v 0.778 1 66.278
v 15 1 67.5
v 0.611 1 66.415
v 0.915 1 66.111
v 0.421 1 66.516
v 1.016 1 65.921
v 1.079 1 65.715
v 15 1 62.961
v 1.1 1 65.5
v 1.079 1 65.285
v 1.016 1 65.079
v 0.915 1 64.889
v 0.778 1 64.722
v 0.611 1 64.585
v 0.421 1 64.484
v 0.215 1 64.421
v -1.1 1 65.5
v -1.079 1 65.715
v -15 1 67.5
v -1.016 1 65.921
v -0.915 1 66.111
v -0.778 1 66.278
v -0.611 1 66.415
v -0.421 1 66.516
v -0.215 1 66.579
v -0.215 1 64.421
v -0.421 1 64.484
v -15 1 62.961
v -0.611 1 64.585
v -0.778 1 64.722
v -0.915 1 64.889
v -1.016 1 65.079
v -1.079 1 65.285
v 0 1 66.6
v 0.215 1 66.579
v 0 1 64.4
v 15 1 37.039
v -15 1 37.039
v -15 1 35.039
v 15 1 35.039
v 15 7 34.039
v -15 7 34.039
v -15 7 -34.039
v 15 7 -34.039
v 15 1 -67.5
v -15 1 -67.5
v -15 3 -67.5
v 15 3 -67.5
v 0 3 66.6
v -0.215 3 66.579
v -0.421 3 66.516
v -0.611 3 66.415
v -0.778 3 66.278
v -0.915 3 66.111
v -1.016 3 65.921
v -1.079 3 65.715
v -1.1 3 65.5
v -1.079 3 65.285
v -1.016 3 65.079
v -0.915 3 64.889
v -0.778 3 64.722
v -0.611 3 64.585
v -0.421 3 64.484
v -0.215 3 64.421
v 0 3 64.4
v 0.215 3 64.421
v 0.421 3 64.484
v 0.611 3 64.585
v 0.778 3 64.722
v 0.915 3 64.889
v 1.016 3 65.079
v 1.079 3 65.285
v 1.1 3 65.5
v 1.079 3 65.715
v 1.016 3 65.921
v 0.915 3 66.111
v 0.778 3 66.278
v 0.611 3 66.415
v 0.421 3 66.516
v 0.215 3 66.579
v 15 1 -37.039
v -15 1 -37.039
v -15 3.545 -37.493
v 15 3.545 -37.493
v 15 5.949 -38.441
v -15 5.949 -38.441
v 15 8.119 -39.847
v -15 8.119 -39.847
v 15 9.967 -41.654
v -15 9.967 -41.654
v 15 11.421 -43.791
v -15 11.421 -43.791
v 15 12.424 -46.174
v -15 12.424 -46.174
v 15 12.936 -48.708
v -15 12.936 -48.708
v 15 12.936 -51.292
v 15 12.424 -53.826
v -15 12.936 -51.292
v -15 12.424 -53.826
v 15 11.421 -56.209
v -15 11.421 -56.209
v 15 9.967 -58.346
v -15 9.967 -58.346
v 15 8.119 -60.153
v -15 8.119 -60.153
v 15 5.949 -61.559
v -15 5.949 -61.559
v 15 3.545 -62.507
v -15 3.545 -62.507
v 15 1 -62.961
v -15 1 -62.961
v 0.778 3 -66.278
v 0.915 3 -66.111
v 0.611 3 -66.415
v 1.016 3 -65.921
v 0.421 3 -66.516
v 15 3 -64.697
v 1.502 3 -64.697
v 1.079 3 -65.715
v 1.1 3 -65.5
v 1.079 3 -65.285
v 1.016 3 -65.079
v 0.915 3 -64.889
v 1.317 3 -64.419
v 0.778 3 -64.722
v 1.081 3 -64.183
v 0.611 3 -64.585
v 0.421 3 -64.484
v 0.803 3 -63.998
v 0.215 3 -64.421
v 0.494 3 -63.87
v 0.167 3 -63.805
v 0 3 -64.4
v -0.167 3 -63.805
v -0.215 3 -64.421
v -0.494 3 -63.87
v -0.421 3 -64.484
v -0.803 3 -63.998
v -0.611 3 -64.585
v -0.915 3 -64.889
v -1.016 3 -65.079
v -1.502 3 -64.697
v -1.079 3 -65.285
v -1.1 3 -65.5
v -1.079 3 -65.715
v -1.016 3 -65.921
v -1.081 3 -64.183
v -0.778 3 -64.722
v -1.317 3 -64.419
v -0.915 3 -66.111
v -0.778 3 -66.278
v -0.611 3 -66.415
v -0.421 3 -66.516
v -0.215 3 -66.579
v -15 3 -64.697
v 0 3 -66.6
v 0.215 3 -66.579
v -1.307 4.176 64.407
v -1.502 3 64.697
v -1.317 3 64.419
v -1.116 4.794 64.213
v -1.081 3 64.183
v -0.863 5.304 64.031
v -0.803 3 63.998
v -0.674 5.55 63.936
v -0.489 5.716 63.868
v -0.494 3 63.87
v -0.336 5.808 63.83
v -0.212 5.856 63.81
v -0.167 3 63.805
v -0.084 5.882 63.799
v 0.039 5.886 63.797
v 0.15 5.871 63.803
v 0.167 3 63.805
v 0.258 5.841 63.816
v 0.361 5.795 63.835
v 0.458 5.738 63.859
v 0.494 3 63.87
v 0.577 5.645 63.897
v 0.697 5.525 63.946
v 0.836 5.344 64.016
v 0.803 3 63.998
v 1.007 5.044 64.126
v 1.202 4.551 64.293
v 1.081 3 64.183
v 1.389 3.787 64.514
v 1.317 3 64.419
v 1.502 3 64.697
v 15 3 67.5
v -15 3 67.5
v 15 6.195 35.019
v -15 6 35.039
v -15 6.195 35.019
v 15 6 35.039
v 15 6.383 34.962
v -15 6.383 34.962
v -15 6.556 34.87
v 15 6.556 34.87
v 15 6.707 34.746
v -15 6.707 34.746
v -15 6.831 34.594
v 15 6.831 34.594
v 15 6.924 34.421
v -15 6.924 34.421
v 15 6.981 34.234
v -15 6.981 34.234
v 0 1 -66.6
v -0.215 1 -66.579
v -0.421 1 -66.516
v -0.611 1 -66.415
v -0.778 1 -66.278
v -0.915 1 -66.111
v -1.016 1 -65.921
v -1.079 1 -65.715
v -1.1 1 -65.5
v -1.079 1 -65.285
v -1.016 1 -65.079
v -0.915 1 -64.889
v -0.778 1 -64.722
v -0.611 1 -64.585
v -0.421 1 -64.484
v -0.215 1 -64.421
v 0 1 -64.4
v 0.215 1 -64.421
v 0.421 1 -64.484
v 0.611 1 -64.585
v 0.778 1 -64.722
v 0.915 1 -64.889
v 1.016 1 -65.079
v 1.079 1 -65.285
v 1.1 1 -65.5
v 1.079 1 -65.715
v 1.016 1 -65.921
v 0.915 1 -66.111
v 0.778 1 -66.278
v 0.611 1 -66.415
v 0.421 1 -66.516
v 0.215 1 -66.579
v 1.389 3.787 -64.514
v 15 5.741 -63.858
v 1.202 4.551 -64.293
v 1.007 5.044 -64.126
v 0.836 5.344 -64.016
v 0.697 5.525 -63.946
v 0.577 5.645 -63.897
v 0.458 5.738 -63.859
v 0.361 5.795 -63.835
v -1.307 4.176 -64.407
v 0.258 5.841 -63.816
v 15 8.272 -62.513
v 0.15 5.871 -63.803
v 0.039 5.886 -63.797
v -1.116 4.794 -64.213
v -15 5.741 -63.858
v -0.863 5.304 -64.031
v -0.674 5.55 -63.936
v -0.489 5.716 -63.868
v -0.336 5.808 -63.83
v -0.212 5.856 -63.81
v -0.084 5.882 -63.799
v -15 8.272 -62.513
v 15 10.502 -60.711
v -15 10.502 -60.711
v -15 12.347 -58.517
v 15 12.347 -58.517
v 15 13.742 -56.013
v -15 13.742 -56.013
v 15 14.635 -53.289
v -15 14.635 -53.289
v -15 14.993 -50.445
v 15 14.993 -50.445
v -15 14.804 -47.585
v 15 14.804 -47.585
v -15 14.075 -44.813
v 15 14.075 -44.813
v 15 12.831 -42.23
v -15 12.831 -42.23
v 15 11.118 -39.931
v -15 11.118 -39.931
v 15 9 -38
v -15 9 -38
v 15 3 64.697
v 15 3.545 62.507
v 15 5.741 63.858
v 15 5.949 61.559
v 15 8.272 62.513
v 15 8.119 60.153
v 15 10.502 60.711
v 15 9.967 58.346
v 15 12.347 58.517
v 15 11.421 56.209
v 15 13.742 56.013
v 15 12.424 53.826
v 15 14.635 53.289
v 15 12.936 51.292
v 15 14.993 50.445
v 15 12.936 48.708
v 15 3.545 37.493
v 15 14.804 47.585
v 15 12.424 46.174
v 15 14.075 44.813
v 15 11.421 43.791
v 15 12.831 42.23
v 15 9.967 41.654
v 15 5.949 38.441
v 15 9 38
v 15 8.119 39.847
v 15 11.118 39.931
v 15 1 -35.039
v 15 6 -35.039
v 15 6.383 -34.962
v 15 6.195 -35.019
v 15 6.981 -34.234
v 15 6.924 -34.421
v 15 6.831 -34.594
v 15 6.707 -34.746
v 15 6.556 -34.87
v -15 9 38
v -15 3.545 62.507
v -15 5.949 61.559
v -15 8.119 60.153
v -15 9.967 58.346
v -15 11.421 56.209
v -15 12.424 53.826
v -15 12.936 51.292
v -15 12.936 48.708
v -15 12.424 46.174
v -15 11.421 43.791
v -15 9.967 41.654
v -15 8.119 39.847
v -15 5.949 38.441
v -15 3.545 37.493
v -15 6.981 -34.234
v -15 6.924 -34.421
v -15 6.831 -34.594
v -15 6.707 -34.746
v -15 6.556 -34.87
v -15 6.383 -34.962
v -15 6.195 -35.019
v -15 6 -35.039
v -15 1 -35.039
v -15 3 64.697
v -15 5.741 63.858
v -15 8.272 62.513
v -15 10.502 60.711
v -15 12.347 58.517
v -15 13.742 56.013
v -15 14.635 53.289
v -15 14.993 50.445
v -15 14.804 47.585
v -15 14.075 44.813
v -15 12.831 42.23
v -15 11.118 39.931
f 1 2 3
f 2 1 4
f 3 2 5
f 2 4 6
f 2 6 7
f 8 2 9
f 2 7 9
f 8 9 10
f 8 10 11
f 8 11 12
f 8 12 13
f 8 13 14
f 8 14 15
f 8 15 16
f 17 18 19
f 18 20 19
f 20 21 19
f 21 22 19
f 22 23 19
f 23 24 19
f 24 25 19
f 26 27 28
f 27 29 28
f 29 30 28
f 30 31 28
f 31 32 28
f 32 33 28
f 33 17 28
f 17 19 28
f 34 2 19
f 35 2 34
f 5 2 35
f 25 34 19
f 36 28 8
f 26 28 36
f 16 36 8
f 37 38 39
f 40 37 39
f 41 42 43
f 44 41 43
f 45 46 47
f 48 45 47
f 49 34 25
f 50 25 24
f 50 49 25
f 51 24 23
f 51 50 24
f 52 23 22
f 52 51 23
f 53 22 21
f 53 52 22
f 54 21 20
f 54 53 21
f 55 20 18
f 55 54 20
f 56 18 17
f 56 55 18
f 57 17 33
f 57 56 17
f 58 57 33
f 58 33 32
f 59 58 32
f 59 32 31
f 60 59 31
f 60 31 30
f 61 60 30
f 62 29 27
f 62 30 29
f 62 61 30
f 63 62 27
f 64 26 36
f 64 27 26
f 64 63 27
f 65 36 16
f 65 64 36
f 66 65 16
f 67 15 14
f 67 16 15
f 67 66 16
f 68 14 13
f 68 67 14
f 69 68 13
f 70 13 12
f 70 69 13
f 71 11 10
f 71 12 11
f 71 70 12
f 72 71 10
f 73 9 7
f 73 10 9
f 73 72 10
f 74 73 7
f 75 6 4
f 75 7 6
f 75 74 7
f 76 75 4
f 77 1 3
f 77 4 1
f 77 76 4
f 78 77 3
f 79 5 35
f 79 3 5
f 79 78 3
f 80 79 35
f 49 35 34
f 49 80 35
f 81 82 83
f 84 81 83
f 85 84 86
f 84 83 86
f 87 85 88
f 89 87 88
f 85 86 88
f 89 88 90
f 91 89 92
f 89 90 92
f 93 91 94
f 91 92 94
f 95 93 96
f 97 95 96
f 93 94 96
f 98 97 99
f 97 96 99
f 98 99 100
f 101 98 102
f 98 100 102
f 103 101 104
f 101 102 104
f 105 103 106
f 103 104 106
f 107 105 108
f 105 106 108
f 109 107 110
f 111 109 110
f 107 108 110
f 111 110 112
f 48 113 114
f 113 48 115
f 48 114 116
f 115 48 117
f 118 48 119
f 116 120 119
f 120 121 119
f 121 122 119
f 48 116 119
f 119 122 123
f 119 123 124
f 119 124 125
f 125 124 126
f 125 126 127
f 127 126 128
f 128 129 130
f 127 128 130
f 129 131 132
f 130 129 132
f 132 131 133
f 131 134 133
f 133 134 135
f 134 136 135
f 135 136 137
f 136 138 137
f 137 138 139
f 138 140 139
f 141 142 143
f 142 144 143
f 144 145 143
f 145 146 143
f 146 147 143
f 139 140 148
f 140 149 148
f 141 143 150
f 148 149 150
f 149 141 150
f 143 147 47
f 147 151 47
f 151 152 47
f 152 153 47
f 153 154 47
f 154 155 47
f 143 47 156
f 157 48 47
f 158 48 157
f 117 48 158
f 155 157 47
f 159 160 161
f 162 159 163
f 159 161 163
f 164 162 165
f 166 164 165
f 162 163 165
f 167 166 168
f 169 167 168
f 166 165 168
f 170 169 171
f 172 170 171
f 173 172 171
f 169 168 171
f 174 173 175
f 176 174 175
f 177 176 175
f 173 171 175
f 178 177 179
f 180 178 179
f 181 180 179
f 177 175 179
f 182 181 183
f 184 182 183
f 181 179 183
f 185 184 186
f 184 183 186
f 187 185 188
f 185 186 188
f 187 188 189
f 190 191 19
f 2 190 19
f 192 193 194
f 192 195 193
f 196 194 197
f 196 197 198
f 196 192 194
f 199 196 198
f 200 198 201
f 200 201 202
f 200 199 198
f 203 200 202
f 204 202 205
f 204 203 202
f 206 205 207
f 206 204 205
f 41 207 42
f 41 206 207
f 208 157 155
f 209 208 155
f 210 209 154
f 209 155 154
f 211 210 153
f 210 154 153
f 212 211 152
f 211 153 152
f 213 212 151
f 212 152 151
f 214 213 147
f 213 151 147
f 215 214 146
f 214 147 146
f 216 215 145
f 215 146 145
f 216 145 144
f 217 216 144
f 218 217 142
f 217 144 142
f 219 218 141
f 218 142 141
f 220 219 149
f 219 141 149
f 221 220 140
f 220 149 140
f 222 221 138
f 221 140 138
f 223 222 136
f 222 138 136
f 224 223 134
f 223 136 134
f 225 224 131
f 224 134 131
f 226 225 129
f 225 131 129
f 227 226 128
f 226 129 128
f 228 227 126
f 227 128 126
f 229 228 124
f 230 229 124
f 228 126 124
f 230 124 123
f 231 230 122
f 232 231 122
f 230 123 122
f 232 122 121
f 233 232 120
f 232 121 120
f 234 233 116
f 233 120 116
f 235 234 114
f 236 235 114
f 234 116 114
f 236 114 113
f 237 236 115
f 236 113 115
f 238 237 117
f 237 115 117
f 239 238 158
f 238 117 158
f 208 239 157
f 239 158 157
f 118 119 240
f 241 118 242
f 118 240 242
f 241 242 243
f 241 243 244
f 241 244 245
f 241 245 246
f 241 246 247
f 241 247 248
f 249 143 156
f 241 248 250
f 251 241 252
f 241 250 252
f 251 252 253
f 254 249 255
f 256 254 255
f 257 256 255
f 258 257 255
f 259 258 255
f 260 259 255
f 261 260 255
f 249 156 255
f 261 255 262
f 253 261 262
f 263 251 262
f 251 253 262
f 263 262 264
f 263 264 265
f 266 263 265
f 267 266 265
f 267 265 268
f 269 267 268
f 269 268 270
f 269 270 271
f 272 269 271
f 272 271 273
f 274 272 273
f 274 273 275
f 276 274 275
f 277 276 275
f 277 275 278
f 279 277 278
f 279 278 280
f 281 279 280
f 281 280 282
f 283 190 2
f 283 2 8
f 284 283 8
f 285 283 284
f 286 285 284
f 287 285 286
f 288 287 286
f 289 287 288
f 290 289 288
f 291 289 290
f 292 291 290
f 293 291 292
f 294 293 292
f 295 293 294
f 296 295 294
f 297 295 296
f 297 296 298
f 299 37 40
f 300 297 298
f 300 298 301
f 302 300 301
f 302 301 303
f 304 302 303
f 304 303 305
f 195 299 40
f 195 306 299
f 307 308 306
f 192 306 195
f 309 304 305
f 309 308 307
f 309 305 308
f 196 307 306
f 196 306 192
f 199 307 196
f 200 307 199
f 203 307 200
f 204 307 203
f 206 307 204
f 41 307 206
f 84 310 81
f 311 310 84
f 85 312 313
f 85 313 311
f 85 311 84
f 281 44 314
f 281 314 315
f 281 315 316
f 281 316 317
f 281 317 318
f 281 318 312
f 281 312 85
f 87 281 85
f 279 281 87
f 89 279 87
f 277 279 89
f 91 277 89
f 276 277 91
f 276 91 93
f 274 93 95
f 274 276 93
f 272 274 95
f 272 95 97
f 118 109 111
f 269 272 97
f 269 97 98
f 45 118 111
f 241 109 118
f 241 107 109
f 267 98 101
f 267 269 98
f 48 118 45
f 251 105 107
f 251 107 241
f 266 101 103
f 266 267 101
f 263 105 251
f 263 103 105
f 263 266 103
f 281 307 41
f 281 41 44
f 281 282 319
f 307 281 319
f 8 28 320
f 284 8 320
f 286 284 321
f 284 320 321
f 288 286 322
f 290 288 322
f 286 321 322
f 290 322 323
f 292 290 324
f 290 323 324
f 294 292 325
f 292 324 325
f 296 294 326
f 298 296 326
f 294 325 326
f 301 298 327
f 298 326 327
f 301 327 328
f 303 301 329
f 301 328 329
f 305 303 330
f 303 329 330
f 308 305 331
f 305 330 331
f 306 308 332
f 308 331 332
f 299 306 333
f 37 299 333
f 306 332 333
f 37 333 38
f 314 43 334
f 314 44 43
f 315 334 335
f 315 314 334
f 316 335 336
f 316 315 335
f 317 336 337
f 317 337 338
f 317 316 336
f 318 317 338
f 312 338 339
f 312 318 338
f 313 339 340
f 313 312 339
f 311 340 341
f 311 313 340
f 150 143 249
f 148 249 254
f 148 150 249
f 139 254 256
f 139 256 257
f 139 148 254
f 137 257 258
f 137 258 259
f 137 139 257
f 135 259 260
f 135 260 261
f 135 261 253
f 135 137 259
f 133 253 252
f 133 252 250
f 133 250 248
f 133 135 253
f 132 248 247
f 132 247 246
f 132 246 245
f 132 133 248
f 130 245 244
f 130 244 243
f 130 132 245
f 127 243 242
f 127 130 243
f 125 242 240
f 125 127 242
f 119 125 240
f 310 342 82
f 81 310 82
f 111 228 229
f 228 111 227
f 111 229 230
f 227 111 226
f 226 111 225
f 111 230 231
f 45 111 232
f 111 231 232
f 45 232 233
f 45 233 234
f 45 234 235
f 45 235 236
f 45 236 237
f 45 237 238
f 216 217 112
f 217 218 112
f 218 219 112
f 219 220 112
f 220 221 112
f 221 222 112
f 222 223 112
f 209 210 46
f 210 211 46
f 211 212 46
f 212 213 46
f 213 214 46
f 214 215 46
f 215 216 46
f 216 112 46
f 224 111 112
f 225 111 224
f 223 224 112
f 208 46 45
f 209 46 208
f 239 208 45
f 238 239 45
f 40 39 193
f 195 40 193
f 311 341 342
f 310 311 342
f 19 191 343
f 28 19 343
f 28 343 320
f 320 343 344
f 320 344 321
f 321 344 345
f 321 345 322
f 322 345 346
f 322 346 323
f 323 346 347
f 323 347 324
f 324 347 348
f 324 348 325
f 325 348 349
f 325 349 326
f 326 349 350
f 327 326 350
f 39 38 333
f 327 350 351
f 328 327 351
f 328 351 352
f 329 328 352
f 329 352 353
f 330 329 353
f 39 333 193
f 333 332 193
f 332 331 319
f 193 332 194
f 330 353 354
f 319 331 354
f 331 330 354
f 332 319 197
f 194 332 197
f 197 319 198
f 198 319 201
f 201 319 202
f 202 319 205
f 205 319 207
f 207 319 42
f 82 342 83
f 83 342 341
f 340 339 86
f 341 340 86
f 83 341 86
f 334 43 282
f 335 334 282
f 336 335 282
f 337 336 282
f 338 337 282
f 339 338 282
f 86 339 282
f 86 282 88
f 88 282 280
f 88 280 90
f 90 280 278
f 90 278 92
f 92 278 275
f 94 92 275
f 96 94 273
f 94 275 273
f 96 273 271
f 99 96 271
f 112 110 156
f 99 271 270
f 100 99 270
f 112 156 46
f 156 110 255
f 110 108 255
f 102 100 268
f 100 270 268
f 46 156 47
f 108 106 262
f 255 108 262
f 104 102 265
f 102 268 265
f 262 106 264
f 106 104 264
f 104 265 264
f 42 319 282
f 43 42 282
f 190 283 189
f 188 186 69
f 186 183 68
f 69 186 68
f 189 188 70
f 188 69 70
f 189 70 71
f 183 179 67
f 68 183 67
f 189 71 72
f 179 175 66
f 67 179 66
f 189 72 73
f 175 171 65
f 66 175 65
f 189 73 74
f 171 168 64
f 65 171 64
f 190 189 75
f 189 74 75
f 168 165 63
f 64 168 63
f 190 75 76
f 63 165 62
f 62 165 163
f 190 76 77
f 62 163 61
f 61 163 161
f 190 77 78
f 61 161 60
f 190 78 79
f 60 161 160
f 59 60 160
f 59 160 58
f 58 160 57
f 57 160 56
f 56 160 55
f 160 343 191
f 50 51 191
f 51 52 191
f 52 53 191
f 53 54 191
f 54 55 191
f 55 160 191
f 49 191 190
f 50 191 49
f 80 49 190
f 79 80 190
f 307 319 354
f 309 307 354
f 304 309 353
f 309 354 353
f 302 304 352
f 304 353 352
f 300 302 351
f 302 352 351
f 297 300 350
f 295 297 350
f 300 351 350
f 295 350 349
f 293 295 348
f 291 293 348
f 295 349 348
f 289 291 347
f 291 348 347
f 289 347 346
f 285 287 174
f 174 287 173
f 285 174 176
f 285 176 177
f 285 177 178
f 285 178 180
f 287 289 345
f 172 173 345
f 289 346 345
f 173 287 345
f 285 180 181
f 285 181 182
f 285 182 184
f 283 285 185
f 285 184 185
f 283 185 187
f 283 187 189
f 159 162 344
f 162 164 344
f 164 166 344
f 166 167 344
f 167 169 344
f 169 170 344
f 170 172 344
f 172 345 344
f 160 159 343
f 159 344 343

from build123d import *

# Parameters (mm, degrees)
EXTRUDE_1_DEPTH      = 15
EXTRUDE_1_DEPTH_BACK = 15
FILLET_4_R           = 1
SKETCH_2_R           = 1.1
CUT_EXTRUDE_1_DEPTH  = 10
SKETCH_3_R           = 1.703478165
CUT_EXTRUDE_2_DEPTH  = 10


with BuildPart() as part:
    # Эскиз1 → Бобышка-Вытянуть1 (new, two sides: drawn at the far end of the back side and taken through both)
    with BuildSketch(Plane(origin=(0, 0, 0), x_dir=(0, 0, -1), z_dir=(1, 0, 0)).offset(-EXTRUDE_1_DEPTH_BACK)):
        with BuildLine():
            Line((-67.5, 3), (-67.5, 1))
            Line((-67.5, 1), (-62.961481397, 1))
            ThreePointArc((-62.961481397, 1), (-50, 13), (-37.038518603, 1))
            Line((-37.038518603, 1), (-35.038518603, 1))
            Line((-35.038518603, 1), (-35.038518603, 7))
            Line((-35.038518603, 7), (35.038518603, 7))
            Line((35.038518603, 7), (35.038518603, 1))
            Line((35.038518603, 1), (37.038518603, 1))
            ThreePointArc((37.038518603, 1), (50, 13), (62.961481397, 1))
            Line((62.961481397, 1), (67.5, 1))
            Line((67.5, 1), (67.5, 3))
            Line((67.5, 3), (64.696938457, 3))
            ThreePointArc((64.696938457, 3), (53.289128952, 14.634945533), (38, 9))
            Line((38, 9), (-38, 9))
            ThreePointArc((-38, 9), (-53.289128952, 14.634945533), (-64.696938457, 3))
            Line((-64.696938457, 3), (-67.5, 3))
        make_face()
    extrude(amount=EXTRUDE_1_DEPTH + EXTRUDE_1_DEPTH_BACK)

    # Скругление4
    fillet_4_edges = [part.edges().sort_by_distance(p)[0] for p in [
        (0, 7, -35.038518603),
        (0, 7, 35.038518603),
    ]]
    fillet(fillet_4_edges, radius=FILLET_4_R)

    # Эскиз2 → Вырез-Вытянуть1 (cut, symmetric)
    with BuildSketch(Plane(origin=(0, 3, 0), x_dir=(1, 0, 0), z_dir=(0, 1, 0))):
        with Locations((0, 65.5)):
            Circle(SKETCH_2_R)
    cut_extrude_1 = extrude(amount=CUT_EXTRUDE_1_DEPTH, both=True, mode=Mode.SUBTRACT)

    # Эскиз3 → Вырез-Вытянуть2 (cut)
    with BuildSketch(Plane(origin=(0, 3, 0), x_dir=(1, 0, 0), z_dir=(0, 1, 0))):
        with Locations((0, 65.5)):
            Circle(SKETCH_3_R)
    cut_extrude_2 = extrude(amount=CUT_EXTRUDE_2_DEPTH, mode=Mode.SUBTRACT)

    # Зеркальное отражение1: Вырез-Вытянуть1, Вырез-Вытянуть2 across plane
    add(cut_extrude_1.mirror(Plane.XY), mode=Mode.SUBTRACT)
    add(cut_extrude_2.mirror(Plane.XY), mode=Mode.SUBTRACT)


solid = part.part
